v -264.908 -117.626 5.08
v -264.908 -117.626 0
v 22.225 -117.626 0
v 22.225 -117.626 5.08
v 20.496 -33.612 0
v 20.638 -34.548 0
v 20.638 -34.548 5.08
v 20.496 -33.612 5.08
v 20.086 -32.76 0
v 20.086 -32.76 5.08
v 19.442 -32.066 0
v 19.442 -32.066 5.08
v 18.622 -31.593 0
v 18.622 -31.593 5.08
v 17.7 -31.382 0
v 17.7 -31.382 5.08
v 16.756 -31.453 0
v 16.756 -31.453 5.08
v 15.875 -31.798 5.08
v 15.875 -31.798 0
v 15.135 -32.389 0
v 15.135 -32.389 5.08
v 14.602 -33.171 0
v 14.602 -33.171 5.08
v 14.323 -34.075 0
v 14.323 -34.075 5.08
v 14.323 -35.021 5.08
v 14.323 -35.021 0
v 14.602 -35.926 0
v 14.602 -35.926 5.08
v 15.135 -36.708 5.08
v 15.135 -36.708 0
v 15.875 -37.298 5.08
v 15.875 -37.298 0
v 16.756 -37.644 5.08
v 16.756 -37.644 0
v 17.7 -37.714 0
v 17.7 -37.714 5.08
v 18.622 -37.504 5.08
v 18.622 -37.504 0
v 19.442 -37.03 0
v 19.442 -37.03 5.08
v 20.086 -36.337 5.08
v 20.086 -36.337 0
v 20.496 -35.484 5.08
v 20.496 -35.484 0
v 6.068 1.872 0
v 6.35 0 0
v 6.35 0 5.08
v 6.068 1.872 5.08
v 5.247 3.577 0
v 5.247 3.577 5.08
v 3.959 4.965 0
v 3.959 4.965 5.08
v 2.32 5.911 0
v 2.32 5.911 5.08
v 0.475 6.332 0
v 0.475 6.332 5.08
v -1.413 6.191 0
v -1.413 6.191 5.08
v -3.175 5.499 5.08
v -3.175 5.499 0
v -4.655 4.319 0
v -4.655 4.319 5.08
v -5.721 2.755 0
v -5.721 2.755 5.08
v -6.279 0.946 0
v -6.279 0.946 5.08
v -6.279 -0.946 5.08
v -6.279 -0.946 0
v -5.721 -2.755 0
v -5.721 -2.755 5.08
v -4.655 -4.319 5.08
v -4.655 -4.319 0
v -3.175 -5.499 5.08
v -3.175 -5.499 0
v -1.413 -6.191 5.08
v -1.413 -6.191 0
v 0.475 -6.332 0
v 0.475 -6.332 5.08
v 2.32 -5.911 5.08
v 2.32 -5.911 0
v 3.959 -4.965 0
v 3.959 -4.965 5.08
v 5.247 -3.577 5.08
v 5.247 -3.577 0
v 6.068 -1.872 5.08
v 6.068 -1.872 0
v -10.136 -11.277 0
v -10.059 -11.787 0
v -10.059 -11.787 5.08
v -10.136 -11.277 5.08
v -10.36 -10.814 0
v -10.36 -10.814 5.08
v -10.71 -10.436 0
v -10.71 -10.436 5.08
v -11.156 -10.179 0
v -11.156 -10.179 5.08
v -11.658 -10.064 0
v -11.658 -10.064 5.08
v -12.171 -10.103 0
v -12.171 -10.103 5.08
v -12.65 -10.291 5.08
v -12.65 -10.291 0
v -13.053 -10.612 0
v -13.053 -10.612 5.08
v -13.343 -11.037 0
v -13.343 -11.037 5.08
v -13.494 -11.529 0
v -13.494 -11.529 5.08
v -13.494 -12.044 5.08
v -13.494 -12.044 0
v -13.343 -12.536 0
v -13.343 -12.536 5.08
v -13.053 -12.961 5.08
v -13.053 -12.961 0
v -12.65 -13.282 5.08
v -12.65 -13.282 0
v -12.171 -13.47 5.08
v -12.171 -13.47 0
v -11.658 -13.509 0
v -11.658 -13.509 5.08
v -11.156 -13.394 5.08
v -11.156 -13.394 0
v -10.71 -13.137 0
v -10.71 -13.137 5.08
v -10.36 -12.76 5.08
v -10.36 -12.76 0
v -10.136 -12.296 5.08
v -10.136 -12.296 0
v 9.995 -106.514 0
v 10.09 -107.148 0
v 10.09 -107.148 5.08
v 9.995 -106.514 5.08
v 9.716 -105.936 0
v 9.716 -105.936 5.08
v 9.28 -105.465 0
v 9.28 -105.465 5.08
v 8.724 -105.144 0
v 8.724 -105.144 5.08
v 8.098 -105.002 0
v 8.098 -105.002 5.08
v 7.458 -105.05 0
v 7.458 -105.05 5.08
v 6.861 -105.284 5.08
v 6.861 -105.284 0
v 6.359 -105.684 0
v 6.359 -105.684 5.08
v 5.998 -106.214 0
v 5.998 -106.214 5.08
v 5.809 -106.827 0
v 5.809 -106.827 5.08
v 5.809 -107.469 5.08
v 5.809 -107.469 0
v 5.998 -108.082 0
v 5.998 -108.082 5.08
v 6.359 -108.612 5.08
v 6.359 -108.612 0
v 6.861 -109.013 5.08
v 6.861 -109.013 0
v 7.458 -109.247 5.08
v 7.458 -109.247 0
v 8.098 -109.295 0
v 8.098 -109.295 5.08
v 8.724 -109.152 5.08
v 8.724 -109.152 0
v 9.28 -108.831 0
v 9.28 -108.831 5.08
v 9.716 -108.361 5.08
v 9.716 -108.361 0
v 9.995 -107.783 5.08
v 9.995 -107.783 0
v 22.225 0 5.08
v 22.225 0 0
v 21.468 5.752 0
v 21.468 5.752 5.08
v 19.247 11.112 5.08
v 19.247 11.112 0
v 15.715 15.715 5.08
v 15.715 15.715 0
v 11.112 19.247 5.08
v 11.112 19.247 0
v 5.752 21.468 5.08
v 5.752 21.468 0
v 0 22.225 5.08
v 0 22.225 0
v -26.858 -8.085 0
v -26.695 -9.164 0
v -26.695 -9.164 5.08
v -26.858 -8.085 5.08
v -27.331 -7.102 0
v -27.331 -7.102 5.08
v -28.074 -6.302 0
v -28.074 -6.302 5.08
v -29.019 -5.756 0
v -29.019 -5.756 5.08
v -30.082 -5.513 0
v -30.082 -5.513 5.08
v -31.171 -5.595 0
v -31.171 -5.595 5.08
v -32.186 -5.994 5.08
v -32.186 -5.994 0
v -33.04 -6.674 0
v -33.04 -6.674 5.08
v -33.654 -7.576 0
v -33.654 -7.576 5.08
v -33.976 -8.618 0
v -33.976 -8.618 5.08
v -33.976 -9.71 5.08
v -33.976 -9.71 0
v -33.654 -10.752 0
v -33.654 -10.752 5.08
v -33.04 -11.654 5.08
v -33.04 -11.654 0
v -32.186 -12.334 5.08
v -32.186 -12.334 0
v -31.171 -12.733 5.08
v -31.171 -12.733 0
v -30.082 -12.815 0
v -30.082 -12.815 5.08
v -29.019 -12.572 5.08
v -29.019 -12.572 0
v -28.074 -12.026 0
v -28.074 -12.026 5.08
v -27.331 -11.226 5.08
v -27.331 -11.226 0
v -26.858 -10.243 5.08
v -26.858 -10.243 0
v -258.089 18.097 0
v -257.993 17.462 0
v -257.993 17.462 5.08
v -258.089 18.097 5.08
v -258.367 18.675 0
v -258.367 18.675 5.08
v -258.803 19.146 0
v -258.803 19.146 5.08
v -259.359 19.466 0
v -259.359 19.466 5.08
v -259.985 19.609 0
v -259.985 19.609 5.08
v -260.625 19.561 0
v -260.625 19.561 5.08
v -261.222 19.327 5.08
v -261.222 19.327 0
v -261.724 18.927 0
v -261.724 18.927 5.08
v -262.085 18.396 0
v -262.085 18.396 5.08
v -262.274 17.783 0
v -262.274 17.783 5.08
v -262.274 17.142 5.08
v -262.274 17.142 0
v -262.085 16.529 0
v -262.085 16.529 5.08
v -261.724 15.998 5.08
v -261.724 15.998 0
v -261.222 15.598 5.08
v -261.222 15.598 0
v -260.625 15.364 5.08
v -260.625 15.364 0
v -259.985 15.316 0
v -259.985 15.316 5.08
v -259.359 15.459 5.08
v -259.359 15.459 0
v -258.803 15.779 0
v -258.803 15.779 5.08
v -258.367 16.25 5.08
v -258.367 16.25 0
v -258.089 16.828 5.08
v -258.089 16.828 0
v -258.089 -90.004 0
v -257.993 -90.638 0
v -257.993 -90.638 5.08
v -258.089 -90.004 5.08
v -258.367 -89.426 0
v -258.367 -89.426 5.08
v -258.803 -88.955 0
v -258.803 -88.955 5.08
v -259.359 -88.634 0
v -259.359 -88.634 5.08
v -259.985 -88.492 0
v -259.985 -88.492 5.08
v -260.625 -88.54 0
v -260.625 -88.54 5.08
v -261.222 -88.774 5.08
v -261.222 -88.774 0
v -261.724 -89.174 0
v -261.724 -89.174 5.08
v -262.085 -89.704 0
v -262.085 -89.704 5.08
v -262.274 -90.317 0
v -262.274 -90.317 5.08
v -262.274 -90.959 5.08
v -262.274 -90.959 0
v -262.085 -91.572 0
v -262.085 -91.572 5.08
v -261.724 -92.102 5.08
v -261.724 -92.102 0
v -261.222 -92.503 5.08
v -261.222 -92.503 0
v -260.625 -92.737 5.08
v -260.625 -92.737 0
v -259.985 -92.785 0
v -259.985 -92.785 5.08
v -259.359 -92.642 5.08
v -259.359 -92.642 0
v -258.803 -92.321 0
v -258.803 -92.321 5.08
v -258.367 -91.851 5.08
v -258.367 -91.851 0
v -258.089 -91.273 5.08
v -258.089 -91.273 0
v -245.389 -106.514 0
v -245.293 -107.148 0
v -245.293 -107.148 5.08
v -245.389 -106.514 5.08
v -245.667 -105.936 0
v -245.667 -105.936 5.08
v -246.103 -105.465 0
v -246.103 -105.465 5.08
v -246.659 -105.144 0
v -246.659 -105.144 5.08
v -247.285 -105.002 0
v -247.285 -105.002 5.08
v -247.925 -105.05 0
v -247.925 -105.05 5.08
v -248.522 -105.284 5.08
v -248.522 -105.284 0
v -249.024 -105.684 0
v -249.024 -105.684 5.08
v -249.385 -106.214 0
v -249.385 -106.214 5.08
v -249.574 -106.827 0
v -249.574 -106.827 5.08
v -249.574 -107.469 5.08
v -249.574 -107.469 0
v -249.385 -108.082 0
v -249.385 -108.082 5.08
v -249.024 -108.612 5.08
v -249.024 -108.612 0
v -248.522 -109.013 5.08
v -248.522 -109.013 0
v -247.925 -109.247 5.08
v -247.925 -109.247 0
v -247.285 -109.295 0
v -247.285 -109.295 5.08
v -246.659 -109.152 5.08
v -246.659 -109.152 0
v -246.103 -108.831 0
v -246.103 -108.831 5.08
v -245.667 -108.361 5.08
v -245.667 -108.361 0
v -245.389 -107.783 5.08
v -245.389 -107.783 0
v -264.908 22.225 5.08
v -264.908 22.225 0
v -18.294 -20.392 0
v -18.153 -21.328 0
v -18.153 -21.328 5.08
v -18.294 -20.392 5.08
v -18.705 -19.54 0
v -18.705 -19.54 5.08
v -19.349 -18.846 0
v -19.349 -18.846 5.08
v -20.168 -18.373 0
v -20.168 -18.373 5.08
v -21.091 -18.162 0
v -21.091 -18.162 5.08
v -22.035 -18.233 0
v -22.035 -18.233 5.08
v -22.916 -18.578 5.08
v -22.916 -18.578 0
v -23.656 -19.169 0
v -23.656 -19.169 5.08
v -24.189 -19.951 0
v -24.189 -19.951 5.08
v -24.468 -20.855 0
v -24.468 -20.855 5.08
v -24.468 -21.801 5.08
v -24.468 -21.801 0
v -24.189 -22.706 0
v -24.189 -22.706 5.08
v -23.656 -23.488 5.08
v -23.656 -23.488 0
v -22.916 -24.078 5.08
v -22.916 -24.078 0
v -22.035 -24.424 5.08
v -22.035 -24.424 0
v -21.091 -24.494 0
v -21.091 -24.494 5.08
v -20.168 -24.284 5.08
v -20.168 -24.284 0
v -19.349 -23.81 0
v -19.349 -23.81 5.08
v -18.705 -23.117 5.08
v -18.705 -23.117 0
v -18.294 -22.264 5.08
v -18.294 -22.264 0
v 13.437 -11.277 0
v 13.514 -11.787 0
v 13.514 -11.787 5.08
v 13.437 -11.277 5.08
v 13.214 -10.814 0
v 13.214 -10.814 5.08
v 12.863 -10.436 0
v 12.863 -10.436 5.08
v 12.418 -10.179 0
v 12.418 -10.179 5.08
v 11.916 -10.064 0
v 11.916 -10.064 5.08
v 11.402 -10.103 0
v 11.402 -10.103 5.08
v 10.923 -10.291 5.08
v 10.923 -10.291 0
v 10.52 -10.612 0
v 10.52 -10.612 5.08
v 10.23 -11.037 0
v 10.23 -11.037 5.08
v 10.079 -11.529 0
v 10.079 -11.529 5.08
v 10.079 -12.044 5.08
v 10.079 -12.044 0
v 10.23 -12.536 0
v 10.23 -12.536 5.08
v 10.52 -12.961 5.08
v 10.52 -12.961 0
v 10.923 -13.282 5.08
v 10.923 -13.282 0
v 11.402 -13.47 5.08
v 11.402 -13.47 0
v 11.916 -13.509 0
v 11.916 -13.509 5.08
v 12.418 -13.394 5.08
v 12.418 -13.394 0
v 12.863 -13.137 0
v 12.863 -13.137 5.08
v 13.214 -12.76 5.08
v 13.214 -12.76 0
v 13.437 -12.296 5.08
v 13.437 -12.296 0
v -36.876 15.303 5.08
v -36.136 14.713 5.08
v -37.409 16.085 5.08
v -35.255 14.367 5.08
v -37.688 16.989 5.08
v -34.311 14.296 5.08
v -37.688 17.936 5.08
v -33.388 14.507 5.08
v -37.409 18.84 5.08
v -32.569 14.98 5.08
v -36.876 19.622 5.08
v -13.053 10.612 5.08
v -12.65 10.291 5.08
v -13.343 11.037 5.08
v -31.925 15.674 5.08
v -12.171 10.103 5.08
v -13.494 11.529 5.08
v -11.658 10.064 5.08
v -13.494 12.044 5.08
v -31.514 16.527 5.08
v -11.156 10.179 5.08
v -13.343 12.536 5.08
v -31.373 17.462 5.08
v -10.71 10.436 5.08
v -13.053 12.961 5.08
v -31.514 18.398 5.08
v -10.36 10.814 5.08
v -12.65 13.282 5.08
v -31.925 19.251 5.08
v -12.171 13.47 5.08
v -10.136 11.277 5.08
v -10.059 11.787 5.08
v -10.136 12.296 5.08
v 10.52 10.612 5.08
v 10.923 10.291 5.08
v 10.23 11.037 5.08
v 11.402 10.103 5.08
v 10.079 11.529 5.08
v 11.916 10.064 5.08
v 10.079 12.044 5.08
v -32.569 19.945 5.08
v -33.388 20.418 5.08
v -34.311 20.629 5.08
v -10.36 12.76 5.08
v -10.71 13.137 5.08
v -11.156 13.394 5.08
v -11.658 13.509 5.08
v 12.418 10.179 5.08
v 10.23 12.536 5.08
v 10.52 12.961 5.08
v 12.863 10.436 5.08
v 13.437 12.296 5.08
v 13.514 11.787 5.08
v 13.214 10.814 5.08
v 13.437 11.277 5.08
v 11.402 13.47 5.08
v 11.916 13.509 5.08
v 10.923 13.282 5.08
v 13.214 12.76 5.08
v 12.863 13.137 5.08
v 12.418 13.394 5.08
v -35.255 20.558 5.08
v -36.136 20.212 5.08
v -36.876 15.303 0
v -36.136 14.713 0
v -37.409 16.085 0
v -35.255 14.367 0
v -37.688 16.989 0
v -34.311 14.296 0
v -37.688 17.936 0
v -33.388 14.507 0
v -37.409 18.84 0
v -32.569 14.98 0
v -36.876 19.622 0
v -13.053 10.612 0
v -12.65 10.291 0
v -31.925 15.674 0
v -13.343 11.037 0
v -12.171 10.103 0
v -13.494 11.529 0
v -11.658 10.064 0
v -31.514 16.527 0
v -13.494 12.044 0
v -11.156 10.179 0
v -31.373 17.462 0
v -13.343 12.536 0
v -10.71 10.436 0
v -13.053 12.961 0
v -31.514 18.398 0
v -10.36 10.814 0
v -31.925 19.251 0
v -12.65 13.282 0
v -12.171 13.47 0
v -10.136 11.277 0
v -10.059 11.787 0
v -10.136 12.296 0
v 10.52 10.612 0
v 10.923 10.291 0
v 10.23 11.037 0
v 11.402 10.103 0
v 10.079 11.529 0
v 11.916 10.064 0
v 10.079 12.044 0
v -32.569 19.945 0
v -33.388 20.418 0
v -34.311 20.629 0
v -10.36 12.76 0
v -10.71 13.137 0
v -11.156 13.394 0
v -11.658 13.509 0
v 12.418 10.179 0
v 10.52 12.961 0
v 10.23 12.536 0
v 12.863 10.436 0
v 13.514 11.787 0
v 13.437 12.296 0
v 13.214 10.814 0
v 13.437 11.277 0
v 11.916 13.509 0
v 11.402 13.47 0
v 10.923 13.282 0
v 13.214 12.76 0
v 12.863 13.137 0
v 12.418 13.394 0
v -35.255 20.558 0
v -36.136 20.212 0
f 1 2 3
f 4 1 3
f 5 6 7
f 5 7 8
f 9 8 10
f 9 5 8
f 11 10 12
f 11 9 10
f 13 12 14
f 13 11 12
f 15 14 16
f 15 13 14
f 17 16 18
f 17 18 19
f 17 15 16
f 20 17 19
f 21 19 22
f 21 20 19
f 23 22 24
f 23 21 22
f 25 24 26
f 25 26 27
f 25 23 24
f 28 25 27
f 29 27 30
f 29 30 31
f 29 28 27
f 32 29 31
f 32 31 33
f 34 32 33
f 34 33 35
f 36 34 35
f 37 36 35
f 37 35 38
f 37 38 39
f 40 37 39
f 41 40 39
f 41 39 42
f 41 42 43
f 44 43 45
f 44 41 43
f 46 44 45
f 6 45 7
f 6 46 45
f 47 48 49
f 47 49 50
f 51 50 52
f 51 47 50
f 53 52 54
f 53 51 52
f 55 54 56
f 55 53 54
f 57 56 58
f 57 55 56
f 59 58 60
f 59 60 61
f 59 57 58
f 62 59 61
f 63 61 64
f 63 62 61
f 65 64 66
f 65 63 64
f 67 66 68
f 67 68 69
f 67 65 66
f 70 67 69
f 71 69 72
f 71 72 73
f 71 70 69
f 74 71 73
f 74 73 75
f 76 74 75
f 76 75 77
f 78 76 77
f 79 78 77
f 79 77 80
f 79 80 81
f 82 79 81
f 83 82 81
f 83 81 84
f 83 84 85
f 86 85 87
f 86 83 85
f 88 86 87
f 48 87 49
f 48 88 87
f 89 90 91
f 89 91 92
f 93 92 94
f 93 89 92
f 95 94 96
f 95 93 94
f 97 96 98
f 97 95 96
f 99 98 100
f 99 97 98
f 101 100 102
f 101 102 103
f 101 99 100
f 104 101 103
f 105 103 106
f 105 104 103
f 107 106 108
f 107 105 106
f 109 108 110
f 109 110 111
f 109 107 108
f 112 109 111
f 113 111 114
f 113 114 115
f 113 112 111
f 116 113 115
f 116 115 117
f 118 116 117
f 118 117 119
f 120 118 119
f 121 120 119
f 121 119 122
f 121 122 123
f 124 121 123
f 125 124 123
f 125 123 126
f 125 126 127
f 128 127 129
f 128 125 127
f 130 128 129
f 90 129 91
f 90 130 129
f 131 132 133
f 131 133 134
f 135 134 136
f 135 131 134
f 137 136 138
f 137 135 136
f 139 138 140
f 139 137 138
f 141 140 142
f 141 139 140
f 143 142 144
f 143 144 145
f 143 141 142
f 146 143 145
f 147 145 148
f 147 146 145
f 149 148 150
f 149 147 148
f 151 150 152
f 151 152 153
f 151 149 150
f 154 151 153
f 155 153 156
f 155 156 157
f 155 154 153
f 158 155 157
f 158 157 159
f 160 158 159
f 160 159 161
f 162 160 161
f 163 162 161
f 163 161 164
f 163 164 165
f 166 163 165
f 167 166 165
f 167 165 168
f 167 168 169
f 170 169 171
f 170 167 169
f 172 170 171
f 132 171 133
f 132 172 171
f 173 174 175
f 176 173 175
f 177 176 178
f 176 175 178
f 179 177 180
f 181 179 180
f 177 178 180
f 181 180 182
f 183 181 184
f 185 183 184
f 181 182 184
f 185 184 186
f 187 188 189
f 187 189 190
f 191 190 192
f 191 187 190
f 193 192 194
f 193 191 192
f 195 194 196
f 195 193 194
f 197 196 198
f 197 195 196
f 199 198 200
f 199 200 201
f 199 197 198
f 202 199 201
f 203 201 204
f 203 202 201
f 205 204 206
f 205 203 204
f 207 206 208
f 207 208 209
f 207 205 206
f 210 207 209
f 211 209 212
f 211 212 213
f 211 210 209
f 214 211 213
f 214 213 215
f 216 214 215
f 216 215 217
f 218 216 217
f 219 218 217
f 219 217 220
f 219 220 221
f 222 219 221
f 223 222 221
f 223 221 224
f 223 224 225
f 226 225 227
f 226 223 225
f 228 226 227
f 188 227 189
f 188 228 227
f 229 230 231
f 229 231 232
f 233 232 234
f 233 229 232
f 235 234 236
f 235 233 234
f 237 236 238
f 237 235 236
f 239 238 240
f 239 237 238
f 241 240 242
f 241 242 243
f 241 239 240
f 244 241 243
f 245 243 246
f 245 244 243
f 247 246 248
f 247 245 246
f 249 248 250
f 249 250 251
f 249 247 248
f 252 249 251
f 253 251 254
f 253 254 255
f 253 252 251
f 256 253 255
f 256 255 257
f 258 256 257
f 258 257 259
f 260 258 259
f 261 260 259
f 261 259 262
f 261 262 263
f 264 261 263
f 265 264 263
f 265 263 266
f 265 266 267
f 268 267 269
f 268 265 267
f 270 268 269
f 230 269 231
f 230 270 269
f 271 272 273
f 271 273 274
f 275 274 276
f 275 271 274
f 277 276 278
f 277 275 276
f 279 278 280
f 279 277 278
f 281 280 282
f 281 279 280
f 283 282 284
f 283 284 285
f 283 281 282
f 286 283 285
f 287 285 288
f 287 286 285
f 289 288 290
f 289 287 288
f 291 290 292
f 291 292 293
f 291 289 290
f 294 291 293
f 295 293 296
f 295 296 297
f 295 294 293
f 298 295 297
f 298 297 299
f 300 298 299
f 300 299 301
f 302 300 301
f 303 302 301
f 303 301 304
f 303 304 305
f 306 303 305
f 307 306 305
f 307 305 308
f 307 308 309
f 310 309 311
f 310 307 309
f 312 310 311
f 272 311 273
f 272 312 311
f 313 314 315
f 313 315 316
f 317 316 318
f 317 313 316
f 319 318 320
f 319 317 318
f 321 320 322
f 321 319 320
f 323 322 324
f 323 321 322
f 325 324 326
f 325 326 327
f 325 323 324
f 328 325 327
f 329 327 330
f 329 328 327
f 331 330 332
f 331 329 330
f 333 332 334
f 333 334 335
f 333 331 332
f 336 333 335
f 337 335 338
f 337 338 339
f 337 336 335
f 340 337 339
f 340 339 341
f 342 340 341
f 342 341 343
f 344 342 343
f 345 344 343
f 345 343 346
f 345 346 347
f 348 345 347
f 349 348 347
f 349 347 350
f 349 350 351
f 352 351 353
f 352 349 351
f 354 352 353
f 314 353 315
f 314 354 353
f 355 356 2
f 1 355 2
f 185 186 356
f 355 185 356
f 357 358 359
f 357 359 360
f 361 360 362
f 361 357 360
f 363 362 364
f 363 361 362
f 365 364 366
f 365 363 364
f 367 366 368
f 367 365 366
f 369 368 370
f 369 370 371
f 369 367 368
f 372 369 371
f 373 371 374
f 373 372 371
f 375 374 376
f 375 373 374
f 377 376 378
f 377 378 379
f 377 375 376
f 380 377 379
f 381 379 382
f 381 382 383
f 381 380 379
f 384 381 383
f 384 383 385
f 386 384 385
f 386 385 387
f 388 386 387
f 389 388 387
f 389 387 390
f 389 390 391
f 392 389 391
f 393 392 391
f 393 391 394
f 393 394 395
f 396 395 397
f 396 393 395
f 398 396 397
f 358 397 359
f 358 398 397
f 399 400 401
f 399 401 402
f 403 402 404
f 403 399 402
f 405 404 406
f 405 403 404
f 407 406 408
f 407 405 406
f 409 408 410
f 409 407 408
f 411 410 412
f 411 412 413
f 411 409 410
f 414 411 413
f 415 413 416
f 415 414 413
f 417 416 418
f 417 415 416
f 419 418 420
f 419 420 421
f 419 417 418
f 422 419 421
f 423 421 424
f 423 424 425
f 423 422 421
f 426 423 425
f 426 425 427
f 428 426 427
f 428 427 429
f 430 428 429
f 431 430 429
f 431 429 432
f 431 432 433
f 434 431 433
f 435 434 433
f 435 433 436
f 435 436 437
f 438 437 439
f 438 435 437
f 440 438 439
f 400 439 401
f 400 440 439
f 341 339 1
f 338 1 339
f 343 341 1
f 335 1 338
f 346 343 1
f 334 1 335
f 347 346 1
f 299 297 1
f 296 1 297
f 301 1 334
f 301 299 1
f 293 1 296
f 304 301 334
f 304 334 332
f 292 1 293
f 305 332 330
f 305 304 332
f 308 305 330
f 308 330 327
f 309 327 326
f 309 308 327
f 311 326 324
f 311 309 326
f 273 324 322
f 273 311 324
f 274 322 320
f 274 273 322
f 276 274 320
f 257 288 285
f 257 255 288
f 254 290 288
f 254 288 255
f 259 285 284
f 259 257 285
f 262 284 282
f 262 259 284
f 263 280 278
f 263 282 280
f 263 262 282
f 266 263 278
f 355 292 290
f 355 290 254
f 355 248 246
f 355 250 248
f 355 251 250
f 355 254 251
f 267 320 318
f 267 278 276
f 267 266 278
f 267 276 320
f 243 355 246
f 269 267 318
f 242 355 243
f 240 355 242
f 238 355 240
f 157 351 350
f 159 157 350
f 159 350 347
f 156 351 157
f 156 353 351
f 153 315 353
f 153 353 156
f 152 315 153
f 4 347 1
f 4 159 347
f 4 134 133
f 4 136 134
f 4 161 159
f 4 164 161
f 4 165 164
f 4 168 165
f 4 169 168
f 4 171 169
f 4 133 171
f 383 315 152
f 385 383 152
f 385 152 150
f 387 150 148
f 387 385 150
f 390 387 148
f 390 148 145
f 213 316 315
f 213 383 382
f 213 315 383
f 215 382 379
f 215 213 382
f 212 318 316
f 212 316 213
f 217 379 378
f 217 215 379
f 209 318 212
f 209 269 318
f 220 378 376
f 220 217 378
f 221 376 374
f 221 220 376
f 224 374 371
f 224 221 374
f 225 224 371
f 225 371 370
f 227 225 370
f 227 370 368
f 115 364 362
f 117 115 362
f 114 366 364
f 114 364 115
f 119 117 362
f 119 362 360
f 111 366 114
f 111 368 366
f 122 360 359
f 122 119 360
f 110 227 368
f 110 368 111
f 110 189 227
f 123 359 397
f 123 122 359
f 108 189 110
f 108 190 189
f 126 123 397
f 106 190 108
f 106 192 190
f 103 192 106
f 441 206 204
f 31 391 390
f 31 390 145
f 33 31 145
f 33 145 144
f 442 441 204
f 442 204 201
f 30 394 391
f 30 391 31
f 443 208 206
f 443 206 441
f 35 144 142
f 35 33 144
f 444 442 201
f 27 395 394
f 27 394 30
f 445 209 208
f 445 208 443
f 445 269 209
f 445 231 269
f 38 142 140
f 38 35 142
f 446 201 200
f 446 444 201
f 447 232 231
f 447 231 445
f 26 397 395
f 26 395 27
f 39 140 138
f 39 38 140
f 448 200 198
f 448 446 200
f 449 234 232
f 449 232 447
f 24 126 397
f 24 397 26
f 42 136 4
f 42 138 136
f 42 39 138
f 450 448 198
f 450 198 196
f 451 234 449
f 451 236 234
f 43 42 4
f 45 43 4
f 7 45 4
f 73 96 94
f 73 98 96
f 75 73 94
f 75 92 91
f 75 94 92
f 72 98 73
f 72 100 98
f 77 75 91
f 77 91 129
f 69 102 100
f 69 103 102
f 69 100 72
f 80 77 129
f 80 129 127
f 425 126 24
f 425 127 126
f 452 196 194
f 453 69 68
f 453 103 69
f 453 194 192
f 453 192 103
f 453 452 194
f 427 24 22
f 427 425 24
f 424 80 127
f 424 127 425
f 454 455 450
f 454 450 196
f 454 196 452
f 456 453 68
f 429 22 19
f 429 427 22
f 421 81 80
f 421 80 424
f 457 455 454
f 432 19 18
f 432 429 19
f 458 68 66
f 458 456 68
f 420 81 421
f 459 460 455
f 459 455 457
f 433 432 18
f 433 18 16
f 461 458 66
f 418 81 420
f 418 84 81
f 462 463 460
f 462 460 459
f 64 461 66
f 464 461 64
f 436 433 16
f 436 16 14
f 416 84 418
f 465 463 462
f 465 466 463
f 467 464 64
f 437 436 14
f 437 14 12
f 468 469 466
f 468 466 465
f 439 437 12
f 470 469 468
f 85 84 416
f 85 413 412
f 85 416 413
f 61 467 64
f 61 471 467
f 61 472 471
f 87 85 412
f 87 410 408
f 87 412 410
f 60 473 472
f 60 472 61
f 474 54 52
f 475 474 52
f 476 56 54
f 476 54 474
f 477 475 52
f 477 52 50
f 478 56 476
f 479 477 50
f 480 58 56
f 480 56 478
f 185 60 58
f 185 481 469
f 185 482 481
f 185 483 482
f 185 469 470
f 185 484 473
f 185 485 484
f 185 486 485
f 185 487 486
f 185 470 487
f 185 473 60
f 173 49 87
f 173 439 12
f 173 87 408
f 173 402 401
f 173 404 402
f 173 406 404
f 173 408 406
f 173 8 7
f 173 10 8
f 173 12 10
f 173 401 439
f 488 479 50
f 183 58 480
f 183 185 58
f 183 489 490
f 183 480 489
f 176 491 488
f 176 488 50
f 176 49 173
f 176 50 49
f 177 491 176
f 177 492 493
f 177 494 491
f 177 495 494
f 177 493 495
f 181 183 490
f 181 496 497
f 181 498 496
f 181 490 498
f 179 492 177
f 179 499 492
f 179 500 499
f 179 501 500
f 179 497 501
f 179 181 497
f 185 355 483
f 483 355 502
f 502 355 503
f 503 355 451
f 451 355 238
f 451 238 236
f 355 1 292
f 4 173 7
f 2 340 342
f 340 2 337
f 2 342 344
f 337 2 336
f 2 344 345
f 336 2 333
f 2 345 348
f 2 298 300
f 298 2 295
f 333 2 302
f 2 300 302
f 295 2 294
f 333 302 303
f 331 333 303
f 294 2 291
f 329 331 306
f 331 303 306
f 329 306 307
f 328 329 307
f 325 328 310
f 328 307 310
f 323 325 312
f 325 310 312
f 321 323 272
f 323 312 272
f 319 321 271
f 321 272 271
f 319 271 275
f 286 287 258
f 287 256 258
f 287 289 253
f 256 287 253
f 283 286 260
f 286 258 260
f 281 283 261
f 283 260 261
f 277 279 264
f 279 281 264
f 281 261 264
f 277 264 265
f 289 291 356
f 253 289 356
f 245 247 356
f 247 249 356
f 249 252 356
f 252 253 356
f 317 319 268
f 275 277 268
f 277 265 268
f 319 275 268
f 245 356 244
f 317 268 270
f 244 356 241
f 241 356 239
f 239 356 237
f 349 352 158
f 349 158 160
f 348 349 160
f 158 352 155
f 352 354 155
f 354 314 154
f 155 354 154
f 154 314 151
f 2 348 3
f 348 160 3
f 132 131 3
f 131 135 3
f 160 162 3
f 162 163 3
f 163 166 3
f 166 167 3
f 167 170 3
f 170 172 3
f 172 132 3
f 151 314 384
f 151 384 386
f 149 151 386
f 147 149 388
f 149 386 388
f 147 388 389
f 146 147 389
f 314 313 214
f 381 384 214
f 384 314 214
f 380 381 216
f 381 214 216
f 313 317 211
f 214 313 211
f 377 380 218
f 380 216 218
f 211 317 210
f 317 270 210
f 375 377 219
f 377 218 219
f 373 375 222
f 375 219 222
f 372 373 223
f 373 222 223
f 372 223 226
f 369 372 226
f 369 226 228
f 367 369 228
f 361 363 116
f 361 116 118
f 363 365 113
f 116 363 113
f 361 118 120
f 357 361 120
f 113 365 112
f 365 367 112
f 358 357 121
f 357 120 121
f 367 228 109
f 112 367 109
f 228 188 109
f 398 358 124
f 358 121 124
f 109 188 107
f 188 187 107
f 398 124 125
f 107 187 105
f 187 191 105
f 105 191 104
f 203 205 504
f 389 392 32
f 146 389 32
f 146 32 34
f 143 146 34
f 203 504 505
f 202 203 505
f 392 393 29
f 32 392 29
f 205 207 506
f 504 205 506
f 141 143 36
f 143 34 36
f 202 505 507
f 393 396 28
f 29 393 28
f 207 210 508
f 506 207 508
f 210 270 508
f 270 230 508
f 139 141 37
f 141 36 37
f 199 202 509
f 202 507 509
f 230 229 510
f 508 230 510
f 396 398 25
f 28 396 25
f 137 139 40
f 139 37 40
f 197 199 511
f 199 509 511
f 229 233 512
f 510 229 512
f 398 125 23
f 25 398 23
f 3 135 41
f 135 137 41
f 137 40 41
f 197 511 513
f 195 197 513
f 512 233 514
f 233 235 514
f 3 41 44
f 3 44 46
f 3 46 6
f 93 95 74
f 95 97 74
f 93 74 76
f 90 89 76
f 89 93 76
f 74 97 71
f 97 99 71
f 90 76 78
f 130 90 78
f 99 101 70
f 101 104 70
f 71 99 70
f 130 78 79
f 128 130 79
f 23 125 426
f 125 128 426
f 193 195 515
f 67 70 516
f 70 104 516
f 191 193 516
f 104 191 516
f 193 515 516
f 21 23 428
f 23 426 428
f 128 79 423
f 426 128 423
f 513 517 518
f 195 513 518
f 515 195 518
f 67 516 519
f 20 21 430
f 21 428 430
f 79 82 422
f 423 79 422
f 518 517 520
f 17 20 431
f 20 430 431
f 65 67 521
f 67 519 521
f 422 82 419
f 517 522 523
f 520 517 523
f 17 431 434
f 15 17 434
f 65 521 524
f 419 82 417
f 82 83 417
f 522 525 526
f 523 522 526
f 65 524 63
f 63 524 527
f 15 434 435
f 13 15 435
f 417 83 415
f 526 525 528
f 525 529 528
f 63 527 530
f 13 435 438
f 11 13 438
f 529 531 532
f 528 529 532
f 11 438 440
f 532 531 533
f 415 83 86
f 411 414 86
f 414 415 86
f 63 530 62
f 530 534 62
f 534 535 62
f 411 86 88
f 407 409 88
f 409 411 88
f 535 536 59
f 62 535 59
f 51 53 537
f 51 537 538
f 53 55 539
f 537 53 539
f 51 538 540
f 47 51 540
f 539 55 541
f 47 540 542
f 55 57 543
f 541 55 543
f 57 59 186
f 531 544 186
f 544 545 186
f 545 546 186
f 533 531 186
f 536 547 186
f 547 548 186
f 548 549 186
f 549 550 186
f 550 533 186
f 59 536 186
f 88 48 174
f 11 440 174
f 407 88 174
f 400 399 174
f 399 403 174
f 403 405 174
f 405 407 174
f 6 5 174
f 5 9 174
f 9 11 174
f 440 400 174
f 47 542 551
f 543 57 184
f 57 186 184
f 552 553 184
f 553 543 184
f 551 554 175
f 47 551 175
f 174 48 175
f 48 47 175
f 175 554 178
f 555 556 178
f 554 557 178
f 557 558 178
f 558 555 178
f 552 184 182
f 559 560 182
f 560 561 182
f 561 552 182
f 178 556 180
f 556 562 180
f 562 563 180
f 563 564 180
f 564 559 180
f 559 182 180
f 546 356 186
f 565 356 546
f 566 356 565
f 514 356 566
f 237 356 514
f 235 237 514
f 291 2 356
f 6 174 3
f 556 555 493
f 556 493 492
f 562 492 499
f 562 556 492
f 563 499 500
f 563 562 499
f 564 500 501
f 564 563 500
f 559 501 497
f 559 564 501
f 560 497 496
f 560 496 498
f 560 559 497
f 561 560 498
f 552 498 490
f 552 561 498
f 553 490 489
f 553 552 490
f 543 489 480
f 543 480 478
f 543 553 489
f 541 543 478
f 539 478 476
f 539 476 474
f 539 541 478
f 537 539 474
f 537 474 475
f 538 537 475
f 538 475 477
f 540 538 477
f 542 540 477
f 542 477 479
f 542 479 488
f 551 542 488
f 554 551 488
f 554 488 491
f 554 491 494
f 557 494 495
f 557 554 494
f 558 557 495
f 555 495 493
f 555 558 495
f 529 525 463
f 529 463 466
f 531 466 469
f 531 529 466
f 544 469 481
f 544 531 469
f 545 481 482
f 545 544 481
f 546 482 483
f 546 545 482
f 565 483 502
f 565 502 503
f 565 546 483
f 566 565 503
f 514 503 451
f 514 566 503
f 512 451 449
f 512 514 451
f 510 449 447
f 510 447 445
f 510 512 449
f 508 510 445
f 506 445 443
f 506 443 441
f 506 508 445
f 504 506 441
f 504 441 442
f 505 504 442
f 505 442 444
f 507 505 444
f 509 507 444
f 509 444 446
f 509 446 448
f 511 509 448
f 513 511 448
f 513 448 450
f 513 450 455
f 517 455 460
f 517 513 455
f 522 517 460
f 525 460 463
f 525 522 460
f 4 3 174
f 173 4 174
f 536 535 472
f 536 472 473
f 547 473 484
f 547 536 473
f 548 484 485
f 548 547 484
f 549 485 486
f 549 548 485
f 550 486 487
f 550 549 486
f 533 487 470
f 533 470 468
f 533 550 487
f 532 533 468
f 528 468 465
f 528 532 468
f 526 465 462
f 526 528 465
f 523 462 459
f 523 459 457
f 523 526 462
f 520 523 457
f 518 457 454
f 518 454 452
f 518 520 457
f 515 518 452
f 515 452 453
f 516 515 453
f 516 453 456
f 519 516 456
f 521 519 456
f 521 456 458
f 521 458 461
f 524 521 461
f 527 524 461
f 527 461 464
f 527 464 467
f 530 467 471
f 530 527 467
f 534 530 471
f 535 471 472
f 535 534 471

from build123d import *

# Parameters (mm, degrees)
F0_R     = 2.15265
F0_R_2   = 3.175
F0_R_3   = 3.660757
F0_R_4   = 1.7272
F0_R_5   = 6.35
F1_DEPTH = 5.08


with BuildPart() as f1:
    # F0 (on Top) → F1 (new body)
    with BuildSketch(Plane.XY):
        with BuildLine():
            Line((0, 22.225), (-264.908055, 22.225))
            Line((-264.908055, 22.225), (-264.908055, -117.625774))
            Line((-264.908055, -117.625774), (22.225, -117.625774))
            Line((22.225, -117.625774), (22.225, -96.670774))
            Line((22.225, -96.670774), (22.225, 0))
            ThreePointArc((22.225, 0), (15.715448, 15.715448), (0, 22.225))
        make_face()
        with Locations((-247.445555, -107.148274)):
            Circle(F0_R, mode=Mode.SUBTRACT)
        with Locations((-260.145555, -90.638274)):
            Circle(F0_R, mode=Mode.SUBTRACT)
        with Locations((7.9375, -107.148274)):
            Circle(F0_R, mode=Mode.SUBTRACT)
        with Locations((-260.145555, 17.4625)):
            Circle(F0_R, mode=Mode.SUBTRACT)
        with Locations((17.4625, -34.548124)):
            Circle(F0_R_2, mode=Mode.SUBTRACT)
        with Locations((-21.328108, -21.328108)):
            Circle(F0_R_2, mode=Mode.SUBTRACT)
        with Locations((-30.356012, -9.164019)):
            Circle(F0_R_3, mode=Mode.SUBTRACT)
        with Locations((-11.786586, -11.786586)):
            Circle(F0_R_4, mode=Mode.SUBTRACT)
        with Locations((11.786586, -11.786586)):
            Circle(F0_R_4, mode=Mode.SUBTRACT)
        Circle(F0_R_5, mode=Mode.SUBTRACT)
        with Locations((-34.548124, 17.4625)):
            Circle(F0_R_2, mode=Mode.SUBTRACT)
        with Locations((-11.786586, 11.786586)):
            Circle(F0_R_4, mode=Mode.SUBTRACT)
        with Locations((11.786586, 11.786586)):
            Circle(F0_R_4, mode=Mode.SUBTRACT)
    extrude(amount=F1_DEPTH)


solid = f1.part
